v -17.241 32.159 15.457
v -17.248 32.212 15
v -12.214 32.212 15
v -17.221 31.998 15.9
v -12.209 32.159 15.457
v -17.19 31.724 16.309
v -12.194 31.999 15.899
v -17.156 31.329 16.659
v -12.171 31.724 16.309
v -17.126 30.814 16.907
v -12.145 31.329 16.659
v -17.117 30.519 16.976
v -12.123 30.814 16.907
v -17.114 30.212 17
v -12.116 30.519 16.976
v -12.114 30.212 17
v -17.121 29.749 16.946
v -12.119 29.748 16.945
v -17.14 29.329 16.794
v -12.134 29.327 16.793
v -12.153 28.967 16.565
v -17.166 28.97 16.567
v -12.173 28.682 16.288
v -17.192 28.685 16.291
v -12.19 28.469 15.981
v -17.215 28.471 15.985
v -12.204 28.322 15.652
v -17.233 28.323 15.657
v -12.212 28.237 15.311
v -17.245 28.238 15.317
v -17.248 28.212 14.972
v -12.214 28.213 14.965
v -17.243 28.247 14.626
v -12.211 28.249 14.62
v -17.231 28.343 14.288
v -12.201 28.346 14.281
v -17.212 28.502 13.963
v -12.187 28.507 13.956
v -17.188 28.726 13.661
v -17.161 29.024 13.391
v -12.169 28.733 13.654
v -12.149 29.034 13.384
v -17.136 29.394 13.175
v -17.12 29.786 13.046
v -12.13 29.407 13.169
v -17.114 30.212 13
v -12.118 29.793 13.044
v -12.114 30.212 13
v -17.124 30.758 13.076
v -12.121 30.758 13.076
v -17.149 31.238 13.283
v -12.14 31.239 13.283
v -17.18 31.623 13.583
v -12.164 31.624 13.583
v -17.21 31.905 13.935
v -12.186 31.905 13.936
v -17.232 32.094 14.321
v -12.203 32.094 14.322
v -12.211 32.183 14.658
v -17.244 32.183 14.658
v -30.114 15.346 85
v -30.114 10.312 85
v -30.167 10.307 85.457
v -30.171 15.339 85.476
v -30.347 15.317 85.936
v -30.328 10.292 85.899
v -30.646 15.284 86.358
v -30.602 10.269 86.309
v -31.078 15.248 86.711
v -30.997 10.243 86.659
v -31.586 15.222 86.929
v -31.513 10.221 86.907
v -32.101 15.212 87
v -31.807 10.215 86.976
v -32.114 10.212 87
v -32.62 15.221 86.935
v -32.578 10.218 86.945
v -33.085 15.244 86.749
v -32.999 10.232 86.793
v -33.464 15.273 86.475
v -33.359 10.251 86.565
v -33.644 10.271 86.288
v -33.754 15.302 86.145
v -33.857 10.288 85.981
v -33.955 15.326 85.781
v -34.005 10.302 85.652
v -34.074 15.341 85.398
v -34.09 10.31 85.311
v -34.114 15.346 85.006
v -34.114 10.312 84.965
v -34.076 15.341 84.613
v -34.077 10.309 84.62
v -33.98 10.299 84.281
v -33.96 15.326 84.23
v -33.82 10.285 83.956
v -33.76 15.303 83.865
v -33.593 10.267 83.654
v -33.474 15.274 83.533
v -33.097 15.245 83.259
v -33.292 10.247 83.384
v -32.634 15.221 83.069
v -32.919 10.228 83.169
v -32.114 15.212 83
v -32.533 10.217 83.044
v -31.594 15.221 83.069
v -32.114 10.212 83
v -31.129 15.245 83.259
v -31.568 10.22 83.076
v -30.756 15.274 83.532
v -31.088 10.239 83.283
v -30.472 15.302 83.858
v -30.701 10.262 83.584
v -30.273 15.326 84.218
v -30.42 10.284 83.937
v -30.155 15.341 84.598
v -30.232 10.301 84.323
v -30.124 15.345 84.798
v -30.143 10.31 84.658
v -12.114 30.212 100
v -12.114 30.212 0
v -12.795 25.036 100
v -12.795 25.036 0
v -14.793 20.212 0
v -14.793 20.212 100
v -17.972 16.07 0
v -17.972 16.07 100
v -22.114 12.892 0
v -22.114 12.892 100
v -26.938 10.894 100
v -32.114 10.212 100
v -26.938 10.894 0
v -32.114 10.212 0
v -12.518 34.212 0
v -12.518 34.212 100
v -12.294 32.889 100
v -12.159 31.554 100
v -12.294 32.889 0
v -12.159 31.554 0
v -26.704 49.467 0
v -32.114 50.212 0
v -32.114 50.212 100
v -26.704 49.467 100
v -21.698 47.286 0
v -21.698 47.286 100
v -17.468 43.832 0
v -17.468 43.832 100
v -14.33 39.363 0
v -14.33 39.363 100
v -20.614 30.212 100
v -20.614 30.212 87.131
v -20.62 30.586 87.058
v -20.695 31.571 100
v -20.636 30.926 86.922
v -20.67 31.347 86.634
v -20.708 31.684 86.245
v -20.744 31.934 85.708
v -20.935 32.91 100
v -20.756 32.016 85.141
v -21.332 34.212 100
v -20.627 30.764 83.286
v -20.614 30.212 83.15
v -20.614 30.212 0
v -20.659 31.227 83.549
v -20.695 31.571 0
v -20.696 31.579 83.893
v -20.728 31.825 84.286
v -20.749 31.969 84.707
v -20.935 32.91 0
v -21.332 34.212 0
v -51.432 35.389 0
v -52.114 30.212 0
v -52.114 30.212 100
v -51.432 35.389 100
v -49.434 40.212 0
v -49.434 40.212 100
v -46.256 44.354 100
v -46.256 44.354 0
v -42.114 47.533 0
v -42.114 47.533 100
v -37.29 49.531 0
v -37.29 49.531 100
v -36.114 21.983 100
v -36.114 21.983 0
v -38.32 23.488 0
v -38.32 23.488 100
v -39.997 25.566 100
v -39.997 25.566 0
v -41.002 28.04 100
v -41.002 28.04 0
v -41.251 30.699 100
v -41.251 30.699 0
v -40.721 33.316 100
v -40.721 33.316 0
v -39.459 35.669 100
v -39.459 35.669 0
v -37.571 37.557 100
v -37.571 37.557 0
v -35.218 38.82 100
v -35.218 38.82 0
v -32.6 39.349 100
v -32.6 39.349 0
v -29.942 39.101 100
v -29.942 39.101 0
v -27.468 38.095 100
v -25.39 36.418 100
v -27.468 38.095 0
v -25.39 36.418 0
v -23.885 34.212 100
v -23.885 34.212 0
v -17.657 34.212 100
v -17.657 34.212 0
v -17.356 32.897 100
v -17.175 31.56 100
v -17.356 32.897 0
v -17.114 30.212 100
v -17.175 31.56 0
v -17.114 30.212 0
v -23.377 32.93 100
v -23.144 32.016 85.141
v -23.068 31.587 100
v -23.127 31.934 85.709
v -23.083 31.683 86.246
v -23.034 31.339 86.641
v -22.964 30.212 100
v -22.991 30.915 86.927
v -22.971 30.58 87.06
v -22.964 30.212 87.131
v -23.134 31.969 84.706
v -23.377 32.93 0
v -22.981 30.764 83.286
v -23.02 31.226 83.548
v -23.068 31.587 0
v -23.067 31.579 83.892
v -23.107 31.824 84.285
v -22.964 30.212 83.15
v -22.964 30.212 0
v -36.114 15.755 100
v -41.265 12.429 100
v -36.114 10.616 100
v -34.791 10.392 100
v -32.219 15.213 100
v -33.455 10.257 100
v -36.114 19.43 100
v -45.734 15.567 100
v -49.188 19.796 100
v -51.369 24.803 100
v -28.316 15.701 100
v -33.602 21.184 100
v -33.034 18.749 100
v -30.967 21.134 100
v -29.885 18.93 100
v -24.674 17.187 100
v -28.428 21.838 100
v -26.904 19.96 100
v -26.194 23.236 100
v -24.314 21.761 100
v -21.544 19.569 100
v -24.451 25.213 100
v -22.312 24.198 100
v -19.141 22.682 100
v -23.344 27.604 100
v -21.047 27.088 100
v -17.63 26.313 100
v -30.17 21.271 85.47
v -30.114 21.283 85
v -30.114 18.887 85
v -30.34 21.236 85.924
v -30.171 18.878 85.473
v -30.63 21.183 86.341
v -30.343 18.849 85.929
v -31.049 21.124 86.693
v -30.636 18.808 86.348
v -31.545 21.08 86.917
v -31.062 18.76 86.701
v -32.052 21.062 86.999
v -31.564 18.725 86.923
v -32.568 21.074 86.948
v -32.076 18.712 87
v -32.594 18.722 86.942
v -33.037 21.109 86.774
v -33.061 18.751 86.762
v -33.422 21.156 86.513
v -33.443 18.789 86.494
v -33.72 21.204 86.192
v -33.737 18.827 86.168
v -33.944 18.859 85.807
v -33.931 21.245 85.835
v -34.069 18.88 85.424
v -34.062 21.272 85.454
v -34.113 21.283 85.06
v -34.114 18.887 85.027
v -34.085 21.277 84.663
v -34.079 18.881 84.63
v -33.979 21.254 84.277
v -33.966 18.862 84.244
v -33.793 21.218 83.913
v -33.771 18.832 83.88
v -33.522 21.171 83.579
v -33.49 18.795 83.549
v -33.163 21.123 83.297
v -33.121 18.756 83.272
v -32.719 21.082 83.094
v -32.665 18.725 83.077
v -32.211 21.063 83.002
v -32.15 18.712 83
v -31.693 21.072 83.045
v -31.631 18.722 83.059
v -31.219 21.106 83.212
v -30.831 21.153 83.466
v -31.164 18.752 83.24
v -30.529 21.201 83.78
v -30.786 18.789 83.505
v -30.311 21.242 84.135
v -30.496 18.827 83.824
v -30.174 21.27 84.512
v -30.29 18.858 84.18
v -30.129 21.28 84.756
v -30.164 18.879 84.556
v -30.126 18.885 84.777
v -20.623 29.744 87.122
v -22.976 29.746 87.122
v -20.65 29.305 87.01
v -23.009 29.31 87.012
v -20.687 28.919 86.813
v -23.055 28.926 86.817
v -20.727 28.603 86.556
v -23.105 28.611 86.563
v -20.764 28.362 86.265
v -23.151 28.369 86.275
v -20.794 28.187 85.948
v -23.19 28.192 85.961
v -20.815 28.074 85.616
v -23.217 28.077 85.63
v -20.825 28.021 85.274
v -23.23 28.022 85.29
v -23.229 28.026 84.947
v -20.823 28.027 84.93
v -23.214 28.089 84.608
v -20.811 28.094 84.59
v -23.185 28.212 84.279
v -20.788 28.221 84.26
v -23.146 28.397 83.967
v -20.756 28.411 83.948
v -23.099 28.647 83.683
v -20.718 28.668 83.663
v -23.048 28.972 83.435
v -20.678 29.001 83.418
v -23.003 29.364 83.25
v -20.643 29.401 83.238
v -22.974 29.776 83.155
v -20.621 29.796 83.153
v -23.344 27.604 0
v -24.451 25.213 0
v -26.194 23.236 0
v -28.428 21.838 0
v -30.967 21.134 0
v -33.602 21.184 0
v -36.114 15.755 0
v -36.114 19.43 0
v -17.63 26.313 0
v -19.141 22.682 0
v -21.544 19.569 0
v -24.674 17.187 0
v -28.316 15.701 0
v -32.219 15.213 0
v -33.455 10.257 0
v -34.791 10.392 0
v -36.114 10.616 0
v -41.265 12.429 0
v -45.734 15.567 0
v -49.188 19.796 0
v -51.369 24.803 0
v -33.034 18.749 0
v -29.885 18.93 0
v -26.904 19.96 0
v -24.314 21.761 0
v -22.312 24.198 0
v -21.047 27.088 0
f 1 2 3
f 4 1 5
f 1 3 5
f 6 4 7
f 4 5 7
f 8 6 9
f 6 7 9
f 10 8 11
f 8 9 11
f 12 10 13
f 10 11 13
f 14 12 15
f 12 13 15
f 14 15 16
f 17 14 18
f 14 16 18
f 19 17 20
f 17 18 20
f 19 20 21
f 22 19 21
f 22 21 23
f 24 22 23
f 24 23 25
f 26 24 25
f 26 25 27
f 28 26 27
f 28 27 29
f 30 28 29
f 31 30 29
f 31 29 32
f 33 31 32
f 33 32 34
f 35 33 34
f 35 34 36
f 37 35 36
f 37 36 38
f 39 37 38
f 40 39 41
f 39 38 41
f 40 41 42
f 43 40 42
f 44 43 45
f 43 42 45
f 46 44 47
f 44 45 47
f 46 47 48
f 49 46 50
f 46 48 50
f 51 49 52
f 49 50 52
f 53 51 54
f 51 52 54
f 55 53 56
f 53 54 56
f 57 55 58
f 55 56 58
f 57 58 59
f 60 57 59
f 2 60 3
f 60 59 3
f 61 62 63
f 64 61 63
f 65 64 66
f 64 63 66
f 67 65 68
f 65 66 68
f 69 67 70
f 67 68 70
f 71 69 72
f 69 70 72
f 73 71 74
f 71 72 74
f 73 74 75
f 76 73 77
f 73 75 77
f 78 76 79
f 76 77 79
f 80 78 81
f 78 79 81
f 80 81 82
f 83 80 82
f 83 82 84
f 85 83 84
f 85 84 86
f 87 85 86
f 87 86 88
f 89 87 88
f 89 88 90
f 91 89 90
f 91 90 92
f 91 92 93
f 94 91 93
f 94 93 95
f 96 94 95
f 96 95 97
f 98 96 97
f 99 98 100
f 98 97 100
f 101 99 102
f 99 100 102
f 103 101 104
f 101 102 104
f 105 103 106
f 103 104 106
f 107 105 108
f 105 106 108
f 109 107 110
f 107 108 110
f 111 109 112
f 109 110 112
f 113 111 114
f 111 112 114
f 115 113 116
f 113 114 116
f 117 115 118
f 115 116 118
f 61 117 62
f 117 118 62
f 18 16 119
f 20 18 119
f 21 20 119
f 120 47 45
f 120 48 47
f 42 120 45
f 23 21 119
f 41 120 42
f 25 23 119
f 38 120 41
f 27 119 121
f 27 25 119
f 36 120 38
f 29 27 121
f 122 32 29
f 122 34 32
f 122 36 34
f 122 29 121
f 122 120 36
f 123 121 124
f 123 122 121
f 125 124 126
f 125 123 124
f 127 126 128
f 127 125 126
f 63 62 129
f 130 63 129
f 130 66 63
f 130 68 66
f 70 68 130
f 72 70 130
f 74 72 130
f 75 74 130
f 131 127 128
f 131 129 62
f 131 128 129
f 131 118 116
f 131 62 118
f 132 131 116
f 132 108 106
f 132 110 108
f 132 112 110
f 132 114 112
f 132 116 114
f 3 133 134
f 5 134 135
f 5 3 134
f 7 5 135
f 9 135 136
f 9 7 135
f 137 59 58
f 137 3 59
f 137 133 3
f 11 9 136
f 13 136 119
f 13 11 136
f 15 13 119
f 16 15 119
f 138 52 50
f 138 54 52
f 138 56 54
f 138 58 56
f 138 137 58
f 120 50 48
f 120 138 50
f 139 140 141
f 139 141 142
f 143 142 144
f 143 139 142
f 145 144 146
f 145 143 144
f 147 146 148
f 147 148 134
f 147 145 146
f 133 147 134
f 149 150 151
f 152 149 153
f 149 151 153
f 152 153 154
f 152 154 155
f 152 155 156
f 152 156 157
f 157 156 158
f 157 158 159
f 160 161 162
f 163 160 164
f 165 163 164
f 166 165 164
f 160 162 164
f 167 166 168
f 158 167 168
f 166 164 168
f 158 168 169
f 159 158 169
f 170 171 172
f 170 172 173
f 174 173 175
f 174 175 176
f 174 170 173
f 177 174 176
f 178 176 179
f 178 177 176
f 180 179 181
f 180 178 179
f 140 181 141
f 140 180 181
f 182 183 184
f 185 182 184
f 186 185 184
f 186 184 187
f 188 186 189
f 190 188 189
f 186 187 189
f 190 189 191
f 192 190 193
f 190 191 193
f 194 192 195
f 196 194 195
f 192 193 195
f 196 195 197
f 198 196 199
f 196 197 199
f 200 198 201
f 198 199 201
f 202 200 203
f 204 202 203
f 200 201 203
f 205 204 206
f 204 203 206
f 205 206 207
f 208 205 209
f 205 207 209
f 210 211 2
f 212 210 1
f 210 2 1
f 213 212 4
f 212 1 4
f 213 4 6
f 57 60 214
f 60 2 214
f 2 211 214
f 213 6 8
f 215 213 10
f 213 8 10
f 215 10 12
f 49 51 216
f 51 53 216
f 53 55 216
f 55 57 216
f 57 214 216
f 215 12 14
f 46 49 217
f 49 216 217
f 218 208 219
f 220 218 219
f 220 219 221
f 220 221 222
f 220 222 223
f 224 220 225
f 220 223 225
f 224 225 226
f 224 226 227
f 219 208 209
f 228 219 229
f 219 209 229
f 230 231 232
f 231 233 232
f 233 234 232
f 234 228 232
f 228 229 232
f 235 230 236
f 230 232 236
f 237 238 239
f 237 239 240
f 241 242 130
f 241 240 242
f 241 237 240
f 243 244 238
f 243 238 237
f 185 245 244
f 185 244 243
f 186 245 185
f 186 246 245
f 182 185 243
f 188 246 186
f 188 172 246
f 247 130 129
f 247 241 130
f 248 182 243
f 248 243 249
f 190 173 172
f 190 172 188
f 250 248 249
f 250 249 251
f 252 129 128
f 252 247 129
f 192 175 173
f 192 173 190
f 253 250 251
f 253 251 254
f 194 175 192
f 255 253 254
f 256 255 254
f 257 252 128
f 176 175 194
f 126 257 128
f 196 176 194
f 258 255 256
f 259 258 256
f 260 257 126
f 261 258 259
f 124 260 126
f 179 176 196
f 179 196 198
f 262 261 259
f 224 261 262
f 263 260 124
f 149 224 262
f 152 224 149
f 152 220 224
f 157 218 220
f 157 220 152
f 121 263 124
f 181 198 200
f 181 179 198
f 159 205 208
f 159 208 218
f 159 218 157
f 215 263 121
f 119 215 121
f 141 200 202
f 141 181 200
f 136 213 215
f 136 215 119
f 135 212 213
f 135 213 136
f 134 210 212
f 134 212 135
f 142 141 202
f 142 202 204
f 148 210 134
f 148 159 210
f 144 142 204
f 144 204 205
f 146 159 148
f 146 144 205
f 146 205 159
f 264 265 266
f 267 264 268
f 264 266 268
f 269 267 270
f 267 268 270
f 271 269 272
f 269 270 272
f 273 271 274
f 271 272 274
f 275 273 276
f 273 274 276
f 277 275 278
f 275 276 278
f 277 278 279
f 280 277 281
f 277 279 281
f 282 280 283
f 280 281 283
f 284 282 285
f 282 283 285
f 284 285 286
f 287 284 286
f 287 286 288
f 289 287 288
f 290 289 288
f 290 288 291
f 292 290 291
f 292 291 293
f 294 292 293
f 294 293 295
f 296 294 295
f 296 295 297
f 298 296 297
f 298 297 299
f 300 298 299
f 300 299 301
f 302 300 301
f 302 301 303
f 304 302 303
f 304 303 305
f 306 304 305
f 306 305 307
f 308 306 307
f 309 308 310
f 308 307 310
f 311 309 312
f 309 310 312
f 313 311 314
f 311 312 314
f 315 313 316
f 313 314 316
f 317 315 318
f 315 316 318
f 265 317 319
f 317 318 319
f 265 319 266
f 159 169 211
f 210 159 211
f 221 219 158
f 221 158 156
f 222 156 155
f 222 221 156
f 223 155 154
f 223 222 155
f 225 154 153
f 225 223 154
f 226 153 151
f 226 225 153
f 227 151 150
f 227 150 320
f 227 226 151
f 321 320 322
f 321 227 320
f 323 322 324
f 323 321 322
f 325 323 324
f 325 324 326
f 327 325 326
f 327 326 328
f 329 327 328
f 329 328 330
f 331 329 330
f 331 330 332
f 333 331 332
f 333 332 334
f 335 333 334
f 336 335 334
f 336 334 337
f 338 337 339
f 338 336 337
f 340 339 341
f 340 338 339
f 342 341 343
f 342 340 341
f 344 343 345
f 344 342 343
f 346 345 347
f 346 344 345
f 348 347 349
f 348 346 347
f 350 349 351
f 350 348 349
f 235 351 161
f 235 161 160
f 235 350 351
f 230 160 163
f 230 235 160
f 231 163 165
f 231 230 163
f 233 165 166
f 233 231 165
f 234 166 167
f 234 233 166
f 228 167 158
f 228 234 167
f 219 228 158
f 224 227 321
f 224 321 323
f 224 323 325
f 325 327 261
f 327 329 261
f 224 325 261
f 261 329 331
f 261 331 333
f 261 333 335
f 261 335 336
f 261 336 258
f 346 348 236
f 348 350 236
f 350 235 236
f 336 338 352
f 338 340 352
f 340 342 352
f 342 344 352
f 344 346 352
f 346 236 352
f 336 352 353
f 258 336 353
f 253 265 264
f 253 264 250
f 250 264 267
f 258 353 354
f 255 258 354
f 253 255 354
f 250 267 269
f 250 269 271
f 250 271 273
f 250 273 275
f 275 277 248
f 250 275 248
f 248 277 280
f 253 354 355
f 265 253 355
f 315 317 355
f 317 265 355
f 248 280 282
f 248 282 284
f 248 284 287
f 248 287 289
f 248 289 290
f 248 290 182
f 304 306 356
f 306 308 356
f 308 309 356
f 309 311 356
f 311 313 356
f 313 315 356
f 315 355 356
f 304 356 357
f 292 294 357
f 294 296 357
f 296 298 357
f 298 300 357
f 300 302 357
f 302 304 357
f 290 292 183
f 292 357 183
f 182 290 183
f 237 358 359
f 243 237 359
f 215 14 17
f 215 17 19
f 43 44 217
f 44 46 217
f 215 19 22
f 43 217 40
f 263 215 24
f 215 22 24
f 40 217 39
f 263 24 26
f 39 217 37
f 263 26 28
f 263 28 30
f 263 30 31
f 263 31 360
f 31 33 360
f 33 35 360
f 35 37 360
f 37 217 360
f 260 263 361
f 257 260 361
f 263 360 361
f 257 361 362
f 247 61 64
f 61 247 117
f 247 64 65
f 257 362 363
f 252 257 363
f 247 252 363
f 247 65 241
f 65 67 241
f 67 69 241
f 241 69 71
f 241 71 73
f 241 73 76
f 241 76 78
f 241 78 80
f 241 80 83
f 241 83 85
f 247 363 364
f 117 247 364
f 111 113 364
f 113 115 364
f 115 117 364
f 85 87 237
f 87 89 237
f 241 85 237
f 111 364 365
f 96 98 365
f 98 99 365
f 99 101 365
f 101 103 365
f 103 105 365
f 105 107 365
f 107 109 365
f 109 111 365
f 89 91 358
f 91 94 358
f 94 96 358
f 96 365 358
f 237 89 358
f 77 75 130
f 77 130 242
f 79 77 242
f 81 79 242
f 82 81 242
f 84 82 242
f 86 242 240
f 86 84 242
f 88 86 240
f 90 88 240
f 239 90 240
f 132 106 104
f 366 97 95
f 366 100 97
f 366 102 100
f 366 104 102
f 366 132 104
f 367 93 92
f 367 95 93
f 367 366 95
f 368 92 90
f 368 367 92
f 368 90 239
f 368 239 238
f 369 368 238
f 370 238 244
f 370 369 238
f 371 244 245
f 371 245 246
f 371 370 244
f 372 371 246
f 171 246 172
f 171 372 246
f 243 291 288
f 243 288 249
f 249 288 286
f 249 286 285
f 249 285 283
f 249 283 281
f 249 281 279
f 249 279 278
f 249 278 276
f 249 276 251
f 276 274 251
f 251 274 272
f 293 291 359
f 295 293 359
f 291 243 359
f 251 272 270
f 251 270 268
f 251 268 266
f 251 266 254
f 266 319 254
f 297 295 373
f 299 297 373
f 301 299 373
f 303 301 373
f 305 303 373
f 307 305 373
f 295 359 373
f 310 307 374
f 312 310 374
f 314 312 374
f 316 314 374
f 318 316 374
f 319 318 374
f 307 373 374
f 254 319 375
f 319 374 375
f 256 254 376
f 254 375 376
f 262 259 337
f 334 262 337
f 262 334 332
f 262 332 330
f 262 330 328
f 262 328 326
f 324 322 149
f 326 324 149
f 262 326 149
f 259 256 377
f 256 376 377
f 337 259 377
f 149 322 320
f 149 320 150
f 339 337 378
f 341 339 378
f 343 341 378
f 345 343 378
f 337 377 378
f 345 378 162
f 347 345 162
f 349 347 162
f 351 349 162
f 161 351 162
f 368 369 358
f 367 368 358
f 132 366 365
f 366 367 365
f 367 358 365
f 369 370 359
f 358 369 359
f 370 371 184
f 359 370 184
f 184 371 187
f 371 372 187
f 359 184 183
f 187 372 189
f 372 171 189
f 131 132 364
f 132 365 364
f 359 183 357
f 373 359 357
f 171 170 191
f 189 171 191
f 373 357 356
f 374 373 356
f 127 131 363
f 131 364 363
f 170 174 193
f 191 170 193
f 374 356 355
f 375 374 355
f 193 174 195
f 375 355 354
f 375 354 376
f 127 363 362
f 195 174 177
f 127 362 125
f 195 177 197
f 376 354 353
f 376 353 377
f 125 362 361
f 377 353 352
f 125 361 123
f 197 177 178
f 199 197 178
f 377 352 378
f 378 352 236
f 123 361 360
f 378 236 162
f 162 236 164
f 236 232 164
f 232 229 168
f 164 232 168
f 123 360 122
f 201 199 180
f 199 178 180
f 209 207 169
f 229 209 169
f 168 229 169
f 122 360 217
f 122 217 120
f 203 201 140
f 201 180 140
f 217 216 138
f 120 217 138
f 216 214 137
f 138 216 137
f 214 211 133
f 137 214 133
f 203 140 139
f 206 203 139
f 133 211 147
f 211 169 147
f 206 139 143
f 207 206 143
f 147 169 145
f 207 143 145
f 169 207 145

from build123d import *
from build123d import SkipClean  # not in build123d's __all__

# Parameters (mm, degrees)
F1_DEPTH = 100
F2_R     = 2
F3_DEPTH = 15
F4_R     = 2
F5_DEPTH = 6
F6_DEPTH = 100.0010001
F8_R     = 2
F9_DEPTH = 10


with BuildPart() as f1:
    # F0 (on Top) → F1 (new body)
    with BuildSketch(Plane.XY):
        with BuildLine():
            ThreePointArc((-36.113968879, 21.9828632864), (-38.5839959268, 36.6822584753), (-23.884600738, 34.2122314274))
            Line((-23.884600738, 34.2122314274), (-21.3320395526, 34.2122314274))
            ThreePointArc((-21.3320395526, 34.2122314274), (-40.2456968626, 38.3439594111), (-36.113968879, 19.430302101))
            Line((-36.113968879, 19.430302101), (-36.113968879, 21.9828632864))
        make_face()
        with BuildLine():
            ThreePointArc((-23.884600738, 34.2122314274), (-23.1970967118, 32.2645205774), (-22.963968879, 30.2122314274))
            ThreePointArc((-22.963968879, 30.2122314274), (-27.2599756775, 22.4558630762), (-36.113968879, 21.9828632864))
            Line((-36.113968879, 21.9828632864), (-36.113968879, 19.430302101))
            ThreePointArc((-36.113968879, 19.430302101), (-25.5470061107, 20.7716276332), (-20.613968879, 30.2122314274))
            ThreePointArc((-20.613968879, 30.2122314274), (-20.7949100123, 32.2442024836), (-21.3320395526, 34.2122314274))
            Line((-21.3320395526, 34.2122314274), (-23.884600738, 34.2122314274))
        make_face()
        with BuildLine():
            ThreePointArc((-52.113968879, 30.2122314274), (-46.2561045027, 44.3543670512), (-32.113968879, 50.2122314274))
            Line((-32.113968879, 50.2122314274), (-52.113968879, 50.2122314274))
            Line((-52.113968879, 50.2122314274), (-52.113968879, 30.2122314274))
        make_face()
        with BuildLine():
            ThreePointArc((-32.113968879, 50.2122314274), (-19.4648582383, 45.7041648123), (-12.5180509367, 34.2122314274))
            ThreePointArc((-12.5180509367, 34.2122314274), (-12.2152458189, 32.2224106675), (-12.113968879, 30.2122314274))
            Line((-12.113968879, 30.2122314274), (-12.113968879, 50.2122314274))
            Line((-12.113968879, 50.2122314274), (-32.113968879, 50.2122314274))
        make_face()
        with BuildLine():
            Line((-12.113968879, 10.2122314274), (-12.113968879, 30.2122314274))
            ThreePointArc((-12.113968879, 30.2122314274), (-17.9718332553, 16.0700958037), (-32.113968879, 10.2122314274))
            Line((-32.113968879, 10.2122314274), (-12.113968879, 10.2122314274))
        make_face()
        with BuildLine():
            ThreePointArc((-32.113968879, 10.2122314274), (-34.1241481191, 10.3135083673), (-36.113968879, 10.6163134852))
            ThreePointArc((-36.113968879, 10.6163134852), (-47.6059022638, 17.5631207868), (-52.113968879, 30.2122314274))
            Line((-52.113968879, 30.2122314274), (-52.113968879, 10.2122314274))
            Line((-52.113968879, 10.2122314274), (-32.113968879, 10.2122314274))
        make_face()
        with BuildLine():
            ThreePointArc((-36.113968879, 15.7553991326), (-42.7205705968, 40.8188331452), (-17.6571365842, 34.2122314274))
            Line((-17.6571365842, 34.2122314274), (-12.5180509367, 34.2122314274))
            ThreePointArc((-12.5180509367, 34.2122314274), (-19.4648582383, 45.7041648123), (-32.113968879, 50.2122314274))
            ThreePointArc((-32.113968879, 50.2122314274), (-46.2561045027, 44.3543670512), (-52.113968879, 30.2122314274))
            ThreePointArc((-52.113968879, 30.2122314274), (-47.6059022638, 17.5631207868), (-36.113968879, 10.6163134852))
            Line((-36.113968879, 10.6163134852), (-36.113968879, 15.7553991326))
        make_face()
        with BuildLine():
            Line((-12.5180509367, 34.2122314274), (-17.6571365842, 34.2122314274))
            ThreePointArc((-17.6571365842, 34.2122314274), (-17.2503810816, 32.2305866462), (-17.113968879, 30.2122314274))
            ThreePointArc((-17.113968879, 30.2122314274), (-23.0310178167, 18.2748950411), (-36.113968879, 15.7553991326))
            Line((-36.113968879, 15.7553991326), (-36.113968879, 10.6163134852))
            ThreePointArc((-36.113968879, 10.6163134852), (-34.1241481191, 10.3135083673), (-32.113968879, 10.2122314274))
            ThreePointArc((-32.113968879, 10.2122314274), (-17.9718332553, 16.0700958037), (-12.113968879, 30.2122314274))
            ThreePointArc((-12.113968879, 30.2122314274), (-12.2152458189, 32.2224106675), (-12.5180509367, 34.2122314274))
        make_face()
        with BuildLine():
            ThreePointArc((-36.113968879, 19.430302101), (-40.2456968626, 38.3439594111), (-21.3320395526, 34.2122314274))
            Line((-21.3320395526, 34.2122314274), (-17.6571365842, 34.2122314274))
            ThreePointArc((-17.6571365842, 34.2122314274), (-42.7205705968, 40.8188331452), (-36.113968879, 15.7553991326))
            Line((-36.113968879, 15.7553991326), (-36.113968879, 19.430302101))
        make_face()
    extrude(amount=F1_DEPTH)

    # F2 (on face) → F3 (cut)
    with BuildSketch(Plane.XZ.offset(-10.2122314274)):
        with Locations((-32.113968879, 85)):
            Circle(F2_R)
    extrude(amount=-F3_DEPTH, mode=Mode.SUBTRACT)

    # F4 (on face) → F5 (cut)
    with BuildSketch(Plane.YZ.offset(-12.113968879)):
        with Locations((30.2122314274, 15)):
            Circle(F4_R)
    extrude(amount=-F5_DEPTH, mode=Mode.SUBTRACT)

    # F0 (on Top) → F6 (cut, through all)
    with BuildSketch(Plane.XY):
        with BuildLine():
            Line((-12.113968879, 10.2122314274), (-12.113968879, 30.2122314274))
            ThreePointArc((-12.113968879, 30.2122314274), (-17.9718332553, 16.0700958037), (-32.113968879, 10.2122314274))
            Line((-32.113968879, 10.2122314274), (-12.113968879, 10.2122314274))
        make_face()
        with BuildLine():
            ThreePointArc((-32.113968879, 10.2122314274), (-34.1241481191, 10.3135083673), (-36.113968879, 10.6163134852))
            ThreePointArc((-36.113968879, 10.6163134852), (-47.6059022638, 17.5631207868), (-52.113968879, 30.2122314274))
            Line((-52.113968879, 30.2122314274), (-52.113968879, 10.2122314274))
            Line((-52.113968879, 10.2122314274), (-32.113968879, 10.2122314274))
        make_face()
        with BuildLine():
            ThreePointArc((-52.113968879, 30.2122314274), (-46.2561045027, 44.3543670512), (-32.113968879, 50.2122314274))
            Line((-32.113968879, 50.2122314274), (-52.113968879, 50.2122314274))
            Line((-52.113968879, 50.2122314274), (-52.113968879, 30.2122314274))
        make_face()
        with BuildLine():
            ThreePointArc((-32.113968879, 50.2122314274), (-19.4648582383, 45.7041648123), (-12.5180509367, 34.2122314274))
            ThreePointArc((-12.5180509367, 34.2122314274), (-12.2152458189, 32.2224106675), (-12.113968879, 30.2122314274))
            Line((-12.113968879, 30.2122314274), (-12.113968879, 50.2122314274))
            Line((-12.113968879, 50.2122314274), (-32.113968879, 50.2122314274))
        make_face()
    with SkipClean():  # cleaning this boolean's faces spoils the solid; the shape is the same uncleaned
        extrude(amount=F6_DEPTH, mode=Mode.SUBTRACT)

    # F8 (on offset) → F9 (cut)
    with BuildSketch(Plane.YZ.offset(-30)):
        with Locations((30.0163067877, 85.1406082511)):
            Circle(F8_R)
    with SkipClean():  # cleaning this boolean's faces spoils the solid; the shape is the same uncleaned
        extrude(amount=F9_DEPTH, mode=Mode.SUBTRACT)


solid = f1.part
